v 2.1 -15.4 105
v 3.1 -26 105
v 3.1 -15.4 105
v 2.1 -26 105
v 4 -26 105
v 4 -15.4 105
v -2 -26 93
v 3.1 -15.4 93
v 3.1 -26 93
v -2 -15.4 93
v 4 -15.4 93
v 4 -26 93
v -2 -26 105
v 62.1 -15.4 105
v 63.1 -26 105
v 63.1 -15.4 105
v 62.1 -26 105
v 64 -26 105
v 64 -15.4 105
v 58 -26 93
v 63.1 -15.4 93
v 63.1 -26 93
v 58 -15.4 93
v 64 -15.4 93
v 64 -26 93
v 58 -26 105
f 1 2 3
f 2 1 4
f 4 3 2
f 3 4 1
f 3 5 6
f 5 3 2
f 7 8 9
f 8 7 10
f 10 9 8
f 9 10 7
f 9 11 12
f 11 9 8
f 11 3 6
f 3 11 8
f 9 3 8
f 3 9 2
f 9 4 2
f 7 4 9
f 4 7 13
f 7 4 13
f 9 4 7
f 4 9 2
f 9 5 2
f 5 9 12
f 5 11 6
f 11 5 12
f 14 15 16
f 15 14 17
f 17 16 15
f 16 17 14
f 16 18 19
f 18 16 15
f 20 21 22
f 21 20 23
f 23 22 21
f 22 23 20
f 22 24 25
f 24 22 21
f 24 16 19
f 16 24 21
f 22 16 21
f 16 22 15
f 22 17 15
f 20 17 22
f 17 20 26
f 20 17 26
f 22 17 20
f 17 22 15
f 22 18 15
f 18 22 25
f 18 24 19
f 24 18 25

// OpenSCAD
// file: ../stage.scad
// ============================================================
//  Positioning stage: base (X dovetail) -> x-slider with column
//  (Z dovetail) -> z-slider (payload face toward +Y) + column cap.
//  Every axis: M3 adjust screw captured in the fixed part by head +
//  nylock, threading into a captive nut in the moving part
//  (0.5 mm/turn, both directions), plus an M3 lock screw.
//  Modules model parts in stage-local coordinates at mid travel.
// ============================================================
include <lib.scad>

// Dovetail standing on the column's +Y face, running along Z.
// multmatrix maps (x,y,z) -> (y,z,x): run->Z, width->X, height->Y.
module zrail_frame() { multmatrix([[0,1,0,0],[0,0,1,0],[1,0,0,0]]) children(); }

module stage_base() {
    rail_x0 = -stage_L / 2;
    rail_len = stage_L - stage_tab_t;
    tab_h = stage_base_h + xs_screw_z + 6;
    difference() {
        union() {
            translate([-stage_L / 2, -stage_D / 2, 0]) cube([stage_L, stage_D, stage_base_h]);
            translate([rail_x0, 0, stage_base_h]) dovetail_rail(rail_len);
            // adjust-screw tab
            translate([stage_L / 2 - stage_tab_t, -8, 0]) cube([stage_tab_t, 16, tab_h]);
        }
        wood_screw_holes(stage_mount_pts, stage_base_h, cbore = 3);
        // X adjust screw through tab (head outside, nylock inside)
        translate([stage_L / 2 - stage_tab_t - 1, 0, stage_base_h + xs_screw_z])
            rotate([0, 90, 0]) screw_hole(m3_d, stage_tab_t + 2);
    }
}

// Upper stack shares the x-slider's X offset.
module stage_x_slider() {
    x0 = xs_xc - xs_len / 2;
    difference() {
        union() {
            translate([x0, -xs_w / 2, stage_base_h]) cube([xs_len, xs_w, xs_h]);
            // column
            translate([xs_xc - col_w / 2, col_y0, xs_top - 0.01]) cube([col_w, col_t, col_h + 0.01]);
            translate([xs_xc, col_y1, xs_top]) zrail_frame() dovetail_rail(col_h);
        }
        translate([x0 - 1, 0, stage_base_h]) dovetail_slot(xs_len + 2);
        // X adjust: screw enters +X face, nut dropped in from the top
        translate([x0 + xs_len + 0.01, 0, stage_base_h + xs_screw_z]) rotate([0, -90, 0])
            screw_hole(m3_d, xs_adj_hole);
        translate([x0 + xs_len - 6 - m3_nut_t / 2, -(m3_nut_af + clr) / 2, stage_base_h + xs_screw_z - 3.5])
            cube([m3_nut_t + 0.4, m3_nut_af + clr, xs_h]);
        // X lock: horizontal from +Y face onto rail flank, nut from top
        translate([xs_xc + 8, xs_w / 2 + 0.01, stage_base_h + 2.5]) rotate([90, 0, 0])
            screw_hole(m3_d, xs_w / 2 - 3);
        translate([xs_xc + 8 - (m3_nut_af + clr) / 2, 9 - (m3_nut_t + 0.4) / 2, stage_base_h + 2.5 - 3.3])
            cube([m3_nut_af + clr, m3_nut_t + 0.4, xs_h]);
        // cap screws (tapped into column top)
        for (sx = [-8, 8]) translate([xs_xc + sx, col_y0 + 5, col_top - 10])
            screw_hole(m3_tap, 10.1);
    }
}

module stage_z_slider() {
    y0 = col_y1;
    x0 = xs_xc - zs_w / 2;
    difference() {
        translate([x0, y0, zs_z0]) cube([zs_w, zs_t, zs_h]);
        translate([xs_xc, col_y1, zs_z0 - 1]) zrail_frame() dovetail_slot(zs_h + 2);
        // payload holes + nut slots from the bottom
        for (p = payload_pts) {
            translate([xs_xc + p[0], payload_face_y + 0.01, stage_payload_z + p[1]])
                rotate([90, 0, 0]) screw_hole(m3_d, 7.5);
            translate([xs_xc + p[0] - (m3_nut_af + clr) / 2, payload_face_y - 4 - (m3_nut_t + 0.4) / 2, zs_z0 - 1])
                cube([m3_nut_af + clr, m3_nut_t + 0.4, zs_h / 2 + 1 + 3.3]);
        }
        // Z adjust: through hole, nut slot from the -X side 5 below the top
        translate([xs_xc + zs_screw_x, zs_screw_y, zs_z0 + zs_h - zs_adj_hole]) screw_hole(m3_d, zs_adj_hole + 0.1);
        translate([x0 - 1, zs_screw_y - (m3_nut_af + clr) / 2, zs_z0 + zs_h - 5 - (m3_nut_t + 0.4) / 2])
            cube([zs_screw_x + zs_w / 2 + 1 + (m3_nut_af + clr) / 2, m3_nut_af + clr, m3_nut_t + 0.4]);
        // Z lock: from the +X (outward) side onto the rail flank, nut dropped in from the top
        lz = zs_z0 + zs_h - 5;
        x1 = x0 + zs_w;
        translate([x1 + 0.01, col_y1 + 2, lz]) rotate([0, -90, 0]) screw_hole(m3_d, zs_w / 2 - 4);
        translate([x1 - 2.5 - (m3_nut_t + 0.4), col_y1 + 2 - zl_pocket_w / 2, lz - (m3_nut_af + clr) / 2 / cos(30)])
            cube([m3_nut_t + 0.4, zl_pocket_w, zs_h]);
    }
}

module stage_z_cap() {
    difference() {
        // stops 1 mm short of the payload face so the payload never rubs it
        translate([xs_xc - col_w / 2, col_y0, col_top]) cube([col_w, payload_face_y - col_y0 - 1, cap_t]);
        for (sx = [-8, 8]) translate([xs_xc + sx, col_y0 + 5, col_top]) screw_hole(m3_d, cap_t);
        translate([xs_xc + zs_screw_x, zs_screw_y, col_top]) screw_hole(m3_d, cap_t);
    }
}

// ---- placed at a fine-travel offset (dx, dz) ----
module stage_x_slider_placed(dx = 0) { translate([dx, 0, 0]) stage_x_slider(); }
module stage_z_cap_placed(dx = 0)    { translate([dx, 0, 0]) stage_z_cap(); }
module stage_z_slider_placed(dx = 0, dz = 0) { translate([dx, 0, dz]) stage_z_slider(); }

// Children placed at the payload face centre (origin on the face, +Y out).
module stage_payload_origin(dx = 0, dz = 0) {
    translate([xs_xc + dx, payload_face_y, stage_payload_z + dz]) children();
}

// Optional mirror (tower B) wraps the stage-local geometry.
module stage_hand(mir) { if (mir) mirror([1, 0, 0]) children(); else children(); }

module stage_assembly(dx = 0, dz = 0) {
    color("SteelBlue") stage_base();
    color("LightSteelBlue") stage_x_slider_placed(dx);
    color("SkyBlue") stage_z_cap_placed(dx);
    color("CadetBlue") stage_z_slider_placed(dx, dz);
}

// ---- travel checks ----
_right_gap = (stage_L / 2 - stage_tab_t) - (xs_xc + xs_len / 2) - locknut_t;
_left_ok   = 10;   // slider may overhang the rail start by up to 10 mm
echo("CHECK", "stage_travel_x", 2 * min(_right_gap, _left_ok));
// adjust screws: head on the fixed tab/cap, tip must pass the moving nut
// at the far travel end and stay inside the hole at the near end
_xnut = xs_xc + xs_len / 2 - 6;                  // nut centre X at mid
_xtip = stage_L / 2 - x_adj_len;
echo("CHECK", "x_adj_engage", (_xnut - stage_travel - (m3_nut_t + 0.4) / 2) - _xtip);
echo("CHECK", "x_adj_hole", _xtip - (xs_xc + xs_len / 2 + stage_travel - xs_adj_hole));
_znut = zs_z0 + zs_h - 5;
_ztip = stage_top_z - z_adj_len;
echo("CHECK", "z_adj_engage", (_znut - stage_travel - (m3_nut_t + 0.4) / 2) - _ztip);
echo("CHECK", "z_adj_hole", _ztip - (zs_z0 + zs_h + stage_travel - zs_adj_hole));
echo("CHECK", "z_lock_pocket_w", zl_pocket_w);
echo("CHECK", "stage_travel_z", 2 * min(stage_gap_z, cap_gap - locknut_t));
// file: ../axes.scad
// ============================================================
//  Plug carriage: X base (fixed, X servo) -> X carriage (rack on
//  its -Y face, Y servo) -> Y carriage (rack on its -X face, male
//  stage pad, cable pillar).
//  World coords; carriage modules take x_pos (plug X) / y_pos.
// ============================================================
include <stage.scad>

runner_w = 10;     // plain (non-dovetail) rear X runner
runner_h = dt_h;

// ---------------- X base ----------------
xb_x0 = x_rail_x0 - 6;
xb_x1 = x_rail_x0 + x_rail_len + 6;
xb_y0 = x_shaft_y - servo_body[0] + servo_shaft_off - 12;
xb_y1 = xc_y1;
xb_screws = [[xb_x0 + 7, xb_y0 + 7], [xb_x1 - 7, xb_y0 + 7],
             [xb_x0 + 7, xb_y1 - 7], [xb_x1 - 7, xb_y1 - 7],
             [(xb_x0 + xb_x1) / 2, xb_y1 - 7]];

module x_servo_holder_world() {
    at_inverted_servo(x_shaft_x, x_shaft_y, x_pinion_z0, 90) mg995_holder();
}
// Holder floor-screw holes, mapped from the holder frame to the floor.
module x_holder_floor_holes() {
    at_inverted_servo(x_shaft_x, x_shaft_y, x_pinion_z0, 90) translate([0, 0, holder_floor_up])
        mirror([0, 0, 1]) translate([0, 0, -xb_t]) holder_floor_holes(xb_t);
}
module x_servo_world() {
    at_inverted_servo(x_shaft_x, x_shaft_y, x_pinion_z0, 90) mg995_model();
    x_servo_holder_world();
}
module x_pinion_world() {
    translate([x_shaft_x, x_shaft_y, x_pinion_z0]) color("Gold") pinion();
}

module x_base() {
    difference() {
        union() {
            translate([xb_x0, xb_y0, 0]) cube([xb_x1 - xb_x0, xb_y1 - xb_y0, xb_t]);
            translate([x_rail_x0, x_rail_y[1], xb_t]) dovetail_rail(x_rail_len);
            translate([x_rail_x0, x_rail_y[0] - runner_w / 2, xb_t - 0.01])
                cube([x_rail_len, runner_w, runner_h + 0.01]);
        }
        wood_screw_holes(xb_screws, xb_t, cbore = 2);
        x_holder_floor_holes();
        // pinion clearance pocket (keeps the plate clear of the gear)
        translate([x_shaft_x, x_shaft_y, xb_t - 1]) cylinder(r = pinion_pd / 2 + gear_mod + 1, h = 2);
        // servo-lead exit notch at the rear edge, plus zip-tie slots
        translate([x_shaft_x - 6, xb_y0 - 1, -1]) cube([12, 8, xb_t + 2]);
        for (dx = [-10, 10]) translate([x_shaft_x + dx - 1.5, xb_y0 + 12, -1]) cube([3, 5, xb_t + 2]);
    }
}

// ---------------- X carriage (modelled at x_pos = 0) ----------------
module y_servo_holder_local() {
    at_inverted_servo(y_shaft_x_rel, y_shaft_y, y_pinion_z0, 90) mg995_holder();
}
module y_holder_floor_holes() {
    at_inverted_servo(y_shaft_x_rel, y_shaft_y, y_pinion_z0, 90) translate([0, 0, holder_floor_up])
        mirror([0, 0, 1]) translate([0, 0, -xc_h]) holder_floor_holes(xc_h);
}
module y_servo_local() {
    at_inverted_servo(y_shaft_x_rel, y_shaft_y, y_pinion_z0, 90) mg995_model();
}

module x_carriage() {
    difference() {
        union() {
            translate([xc_x0, xc_y0, xc_z0]) cube([xc_len, xc_y1 - xc_y0, xc_h]);
            // X rack on the -Y face, teeth toward -Y
            translate([xc_x0, xc_y0 + 0.01, x_rack_z0]) mirror([0, 1, 0]) rack(xc_len, base_h = rack_base);
            // Y rail on top, under the Y carriage
            translate([-xs_xc, xc_y0, xc_top]) rotate([0, 0, 90]) dovetail_rail(xc_y1 - xc_y0);
        }
        y_holder_floor_holes();
        translate([xc_x0 - 1, x_rail_y[1], xc_z0]) dovetail_slot(xc_len + 2);
        translate([xc_x0 - 1, x_rail_y[0] - runner_w / 2 - clr - 0.15, xc_z0 - 1])
            cube([xc_len + 2, runner_w + 2 * clr + 0.3, runner_h + clr + 1]);
        translate([xc_x0 - 1, x_rail_y[0], xc_z0]) rotate([90, 0, 90]) linear_extrude(xc_len + 2)
            chamfer_mouth(runner_w + 2 * clr + 0.3);
        // lightening / Y-servo lead pass-through + zip-tie slots
        translate([y_shaft_x_rel - 6, xc_y0 + 3, xc_top - 4]) cube([12, 6, 5]);
        for (dy = [12, 24]) translate([xc_x0 + 3, xc_y0 + dy, xc_z0 + runner_h + 2]) cube([5, 3, xc_h]);
    }
}
module x_carriage_world(x_pos) { translate([x_pos, 0, 0]) x_carriage(); }
module y_servo_world(x_pos) { translate([x_pos, 0, 0]) { y_servo_local(); y_servo_holder_local(); } }
module y_pinion_world(x_pos) {
    translate([x_pos + y_shaft_x_rel, y_shaft_y, y_pinion_z0]) color("Gold") pinion();
}

echo("CHECK", "x_rail_len", x_rail_len);
// X base front edge to the port towers' base front edge (Y)
echo("CHECK", "xbase_tower_gap", (tower_y - stage_D / 2) - xb_y1);
echo("CHECK", "x_mesh_gap", (x_pitch_y - x_shaft_y) - pinion_pd / 2);
echo("CHECK", "x_travel_needed", x_pos_max - x_pos_min);

// ---------------- Y carriage (coords relative to male stage origin
//                  in X/Y, world Z) ----------------
pillar_w   = 16;
// top of the flexure frame (mirrors plug_mount.scad) + 6 so the cable clears it
pillar_top = port_z + plug_drop - 1 + flex_isl_h + 6 + 5 + 6;

module y_carriage() {
    difference() {
        union() {
            translate([yc_x0, yc_y0, yc_z0]) cube([yc_x1 - yc_x0, yc_len, yc_h]);
            // Y rack on the -X face, teeth toward -X
            translate([yc_x0 + 0.01, yc_y0, y_rack_z0]) rotate([0, 0, 90]) rack(yc_len, base_h = rack_base);
            // cable strain-relief pillar at the rear, in line with the plug
            translate([xs_xc - pillar_w / 2, yc_y0, yc_z0]) cube([pillar_w, yc_pillar_d, pillar_top - yc_z0]);
        }
        translate([0, yc_y0 - 1, yc_z0]) rotate([0, 0, 90]) dovetail_slot(yc_len + 2);
        // M4 bolts up through captive nuts into the stage base
        for (p = stage_mount_pts) translate([p[0], p[1], yc_z0]) {
            screw_hole(m4_d, yc_h);
            translate([0, 0, -0.01]) m4_nut_trap(m4_nut_t + 0.5);
        }
        // two zip-tie slots through the pillar, near its front face
        for (dz = [6, 18]) translate([xs_xc - pillar_w / 2 - 1, yc_y0 + yc_pillar_d - 5.5, pillar_top - dz])
            cube([pillar_w + 2, 3, 5]);
    }
}
module y_carriage_world(x_pos, y_pos) {
    o = ms_origin(x_pos, y_pos);
    translate([o[0], o[1], 0]) y_carriage();
}

echo("CHECK", "m4_stage_bolt_protrude", m4_stage_bolt_len - ((stage_base_h - 3) + yc_h));
echo("CHECK", "y_mesh_gap", ((y_pitch_x_rel - xs_xc) - y_shaft_x_rel) - pinion_pd / 2);
echo("CHECK", "pillar_top_z", pillar_top);
echo("CHECK", "pillar_min", port_z + 25);
// rack length left past the pinion centre at the worst travel end
echo("CHECK", "x_rack_engage_min",
     min(x_shaft_x - (x_pos_max + xc_x0), (x_pos_min + xc_x1) - x_shaft_x));
echo("CHECK", "y_rack_engage_min",
     min(y_shaft_y - (ms_origin(0, y_travel)[1] + yc_y0), (ms_origin(0, 0)[1] + yc_y1) - y_shaft_y));
// file: ../port_tower.scad
// ============================================================
//  Female port tower: positioning stage (rotated 180 deg so its
//  payload face looks toward -Y) + bracket plate with the keyed
//  D-hole. The bulkhead goes in from the back (flange behind the
//  plate), nut on the front. Plate front face is at world y=0.
// ============================================================
include <stage.scad>

bracket_w      = 36;
bracket_hole_dz = port_z - stage_payload_z;   // hole above payload centre
bracket_bot    = -zs_h / 2;
bracket_top    = bracket_hole_dz + bh_nut_af / cos(30) / 2 + 3;
rib_t          = 5;     // rib width (X)
rib_d          = 7;     // rib depth (out of the plate front)

// Payload-face coordinates: origin at face centre, +Y away from the stage.
module port_bracket() {
    difference() {
        union() {
            translate([-bracket_w / 2, 0, bracket_bot]) cube([bracket_w, plate_t, bracket_top - bracket_bot]);
            // stiffening ribs, outboard of the nut and clear of the plug clamp
            for (sx = [-1, 1])
                translate([sx > 0 ? bracket_w / 2 - rib_t : -bracket_w / 2, plate_t - 0.01, bracket_bot])
                    hull() {
                        cube([rib_t, rib_d, 1]);
                        translate([0, 0, bracket_hole_dz - 14]) cube([rib_t, 0.01, 1]);
                    }
        }
        // keyed D-hole, flat on top
        translate([0, plate_t, bracket_hole_dz]) rotate([90, 0, 0]) d_hole(t = plate_t);
        // mounting screws into the z-slider's captive nuts
        for (p = payload_pts) translate([p[0], -0.01, p[1]]) rotate([-90, 0, 0]) {
            screw_hole(m3_d, plate_t + rib_d);
        }
    }
}

// Whole tower in world coordinates at fine-travel offset (dx, dz),
// measured in world X / Z.
// Tower B (i=1) is the mirror image so its X adjust screw faces outward.
module port_tower_world(i, dx = 0, dz = 0) {
    ldx = i == 0 ? -dx : dx;   // world dx -> stage-local dx
    translate([tower_x(i), tower_y, 0]) rotate([0, 0, 180]) stage_hand(i == 1) {
        stage_assembly(ldx, dz);
        stage_payload_origin(ldx, dz) color("Orange") port_bracket();
    }
}

// Bulkhead connector stand-in (for checks / preview), world coords.
module bulkhead_world(i, dx = 0, dz = 0) {
    translate([port_x[i] + dx, port_face_y, port_z + dz]) rotate([90, 0, 0]) color("DimGray") {
        cylinder(d = bh_thread_d, h = bh_thread_len - plate_t);                   // thread + face
        cylinder(d = bh_nut_af / cos(30), h = bh_nut_t, $fn = 6);                  // nut
        translate([0, 0, -plate_t - 2]) cylinder(d = bh_flange_d, h = 2);          // flange
        translate([0, 0, -plate_t - 40]) cylinder(d = 14, h = 38);                 // body
    }
}

echo("CHECK", "port_z", port_z);
// file: ../plug_mount.scad
// ============================================================
//  Male plug mount: flexure (frame + 4 L-beams + floating island with
//  the clamp cradle built in), clamp cap, and two identical stop
//  straps (front + back) whose pins limit X/Z float to +/-flex_float
//  and whose 1 mm standoff limits Y float to +/-flex_stop_gap.
//  Local coords: origin at the stage payload face centre, +Y away from
//  the stage, Z relative to the payload centre.
// ============================================================
include <port_tower.scad>
include <axes.scad>

plug_dz  = port_z - (yc_top + stage_payload_z);   // plug centre above payload centre
blk_x    = plug_bx / 2 + 0.1;           // snug in X
blk_y0   = flex_t + clamp_wall;                   // block back face
blk_y1   = blk_y0 + plug_by;                // block front face
blk_z0   = plug_dz + plug_drop;                   // block bottom
blk_z1   = blk_z0 + plug_block[2];
crad_x   = blk_x + 5;                             // cradle half width
crad_y1  = blk_y1 - 0.4;                          // cradle stops short: cap clamps the block
cap_back_y = crad_y1;
crad_scr = blk_x + 2.5;                           // cradle screw X
clamp_ledge = 0.5;                                // keeps clamp >= 12.5 above plug centre

isl_x    = 19;                                    // island half width
isl_z0   = blk_z0 - 1;
isl_z1   = isl_z0 + flex_isl_h;
flex_g   = 6;                                     // island-to-frame gap
in_x     = isl_x + flex_g;
in_z0    = isl_z0 - flex_g;
in_z1    = isl_z1 + flex_g;
fr_bar   = 5;
fr_x     = in_x + fr_bar;
fr_z0    = -zs_h / 2;
fr_z1    = in_z1 + fr_bar;

pin_d    = 4;
pin_z    = isl_z1 - 4;
pin_hole = pin_d + 2 * flex_float;
strap_w  = 8;
strap_t  = 3;
strap_foot_w = 18;
strap_z0 = pin_z - 4;
strap_scr = [-5, 5];                              // strap screw X (through the top bar)
strap_scr_z = (in_z1 + fr_z1) / 2;

// one L-beam: island bottom face -> down -> outward -> up -> frame side
leg = 3;
function beam_path(sx, sz) = let(zc = (isl_z0 + isl_z1) / 2,
    zi = sz < 0 ? isl_z0 : isl_z1,
    zh = zi + sz * leg,
    zv = zc + sz * (flex_g - 2 + 0.5),
    xv = sx * (isl_x + leg))
    [[sx * 10, zi], [sx * 10, zh], [xv, zh], [xv, zv], [sx * in_x, zv]];

module poly_beam(pts, w) {
    for (k = [0:len(pts) - 2]) hull() {
        translate(pts[k]) square(w, center = true);
        translate(pts[k + 1]) square(w, center = true);
    }
}

// XZ outline helpers: 2D (x, z) extruded along +Y from y0, thickness t
module xz_extrude(y0, t) { translate([0, y0 + t, 0]) rotate([90, 0, 0]) linear_extrude(t) children(); }

module plug_flexure() {
    difference() {
        union() {
            xz_extrude(0, flex_t) {
                difference() {
                    translate([-fr_x, fr_z0]) square([2 * fr_x, fr_z1 - fr_z0]);
                    translate([-in_x, in_z0]) square([2 * in_x, in_z1 - in_z0]);
                }
                translate([-isl_x, isl_z0]) square([2 * isl_x, isl_z1 - isl_z0]);
                for (sx = [-1, 1], sz = [-1, 1]) poly_beam(beam_path(sx, sz), flex_beam_w);
            }
            // clamp cradle on the island front: back wall + side walls
            translate([-crad_x, flex_t - 0.01, blk_z0]) cube([2 * crad_x, clamp_wall + 0.01, plug_block[2]]);
            for (sx = [-1, 1]) translate([sx > 0 ? blk_x : -crad_x, blk_y0 - 0.01, blk_z0])
                cube([crad_x - blk_x, crad_y1 - blk_y0 + 0.01, plug_block[2]]);
            // Z retention: thin ledge under the block, lips over its top corners
            translate([-crad_x, blk_y0 - 0.01, blk_z0 - clamp_ledge]) cube([2 * crad_x, crad_y1 - blk_y0 + 0.01, clamp_ledge]);
            for (sx = [-1, 1]) translate([sx > 0 ? blk_x - 1 : -crad_x, blk_y0 - 0.01, blk_z1])
                cube([crad_x - blk_x + 1, crad_y1 - blk_y0 + 0.01, 1.5]);
        }
        // payload screws into the stage z-slider
        for (p = payload_pts) translate([p[0], -0.01, p[1]]) rotate([-90, 0, 0]) screw_hole(m3_d, flex_t);
        // stop-pin hole (through) and strap screws (through the top bar)
        translate([0, -0.01, pin_z]) rotate([-90, 0, 0]) screw_hole(pin_hole, flex_t);
        for (x = strap_scr) translate([x, -0.01, strap_scr_z]) rotate([-90, 0, 0]) screw_hole(m3_d, flex_t);
        // cap screws, tapped into the cradle side walls
        for (sx = [-1, 1]) translate([sx * crad_scr, crad_y1 + 0.01, (blk_z0 + blk_z1) / 2])
            rotate([90, 0, 0]) screw_hole(m3_tap, crad_y1 - flex_t + 1);
    }
}

// Clamp cap: 1.5 mm over the block, thicker over the screws.
module plug_clamp_cap() {
    // flat back at the cradle front: squeezes the block (it stands 0.4 proud)
    difference() {
        union() {
            translate([-crad_x, cap_back_y, blk_z0]) cube([2 * crad_x, blk_y1 - cap_back_y + clamp_lip_t, plug_block[2]]);
            for (sx = [-1, 1]) translate([sx > 0 ? blk_x : -crad_x, cap_back_y, blk_z0])
                cube([crad_x - blk_x, 4, plug_block[2]]);
        }
        for (sx = [-1, 1]) translate([sx * crad_scr, cap_back_y - 0.01, (blk_z0 + blk_z1) / 2])
            rotate([-90, 0, 0]) screw_hole(m3_d, 5);
    }
}

// Stop strap in its own frame: back face on y=0, pin toward -Y.
module plug_flex_stop() {
    difference() {
        union() {
            translate([-strap_w / 2, 0, strap_z0]) cube([strap_w, strap_t, fr_z1 - strap_z0]);
            translate([-strap_foot_w / 2, -flex_stop_gap, in_z1]) cube([strap_foot_w, strap_t + flex_stop_gap, fr_z1 - in_z1]);
            translate([0, 0.01, pin_z]) rotate([90, 0, 0]) cylinder(d = pin_d, h = flex_stop_gap + 2);
        }
        for (x = strap_scr) translate([x, -flex_stop_gap - 0.01, strap_scr_z]) rotate([-90, 0, 0])
            screw_hole(m3_d, strap_t + flex_stop_gap);
    }
}

module plug_flex_stops_placed() {
    translate([0, flex_t + flex_stop_gap, 0]) plug_flex_stop();                       // front
    translate([0, -flex_stop_gap, 0]) mirror([0, 1, 0]) plug_flex_stop();            // back
}

module plug_body_local() {
    color("White") {
        translate([-plug_bx / 2, blk_y0, blk_z0]) cube([plug_bx, plug_by, plug_block[2]]);
        translate([0, blk_y0 + plug_by / 2, blk_z1]) cylinder(d = 4.5, h = 15);              // cable
        hull() {
            translate([-plug_bx / 2, blk_y0, plug_dz - 4]) cube([plug_bx, plug_by, blk_z0 - plug_dz + 4]);
            translate([0, blk_y1 + plug_head_proj - 1, plug_dz]) rotate([-90, 0, 0]) cylinder(d = 8, h = 1);
        }
    }
}

// Everything that moves with the plug carriage, minus the plug itself.
module plug_mount_world(x_pos, y_pos, dx = 0, dz = 0) {
    o = ms_origin(x_pos, y_pos);
    translate(o) {
        stage_assembly(dx, dz);
        stage_payload_origin(dx, dz) {
            color("Orange") plug_flexure();
            color("Gold") plug_clamp_cap();
            color("Khaki") plug_flex_stops_placed();
        }
    }
}
module plug_body_world(x_pos, y_pos, dx = 0, dz = 0) {
    o = ms_origin(x_pos, y_pos);
    translate(o) stage_payload_origin(dx, dz) plug_body_local();
}

// ---- checks ----
echo("CHECK", "clamp_lip_t", clamp_lip_t);
echo("CHECK", "clamp_preload", blk_y1 - cap_back_y);
echo("CHECK", "clamp_x_play", blk_x - plug_bx / 2);
echo("CHECK", "pillar_above_flex", pillar_top - (yc_top + stage_payload_z + fr_z1));
echo("CHECK", "clamp_bottom_above_plug", blk_z0 - clamp_ledge - plug_dz);
echo("CHECK", "plug_insert_err",
     (ms_origin(0, y_travel)[1] + payload_face_y + blk_y1 + plug_head_proj) - bh_face_y);
echo("CHECK", "flex_xz_stop", (pin_hole - pin_d) / 2);
// beam-to-island and beam-to-frame clearance must exceed the stop travel
echo("CHECK", "flex_beam_clear", leg - flex_beam_w / 2);
// file: ../assembly_lib.scad
// World-placement groups shared by assembly.scad and the full-machine
// collision test. Pinions are left out of these groups because they
// mesh with the racks by design.
include <plug_mount.scad>

module fixed_world() {
    for (i = [0, 1]) { port_tower_world(i); bulkhead_world(i); }
    color("Tan") x_base();
    x_servo_world();
}

module moving_world(x_pos, y_pos) {
    color("LightGreen") x_carriage_world(x_pos);
    y_servo_world(x_pos);
    color("Yellow") y_carriage_world(x_pos, y_pos);
    plug_mount_world(x_pos, y_pos);
}
// file: probe_lib.scad
// Fit probes built only from the port position and the measured part
// sizes (not from the bracket / clamp variables), so they test the real
// geometry rather than restating its formulas.
include <../assembly_lib.scad>

// Bulkhead thread cross-section (15 mm, flat 6.5 mm from centre, on top)
// pushed through port i's plate, offset by d = [dx, dz].
module probe_port_thread(i, d) {
    translate([port_x[i] + d[0], port_face_y + plate_t + 1, port_z + d[1]]) rotate([90, 0, 0])
        linear_extrude(plate_t + 2) intersection() {
            circle(d = bh_thread_d, $fn = 96);
            translate([-bh_thread_d, -bh_thread_d]) square([2 * bh_thread_d, bh_thread_d + bh_flat]);
        }
}
module probe_port_hole(d) {
    for (i = [0, 1]) intersection() { port_tower_world(i); probe_port_thread(i, d); }
}

// Plug clamp block where it must sit for the magnetic face to meet port
// i's face: face centre at (port_x, bh_face_y, port_z).
module probe_block(i, d) {
    translate([port_x[i] - plug_bx / 2 + d[0],
               bh_face_y - plug_head_proj - plug_by + d[1],
               port_z + plug_drop + d[2]])
        cube([plug_bx, plug_by, plug_block[2]]);
}
// Seat = flexure cradle only (the cap squeezes the block on purpose).
module probe_plug_seat(d) {
    for (i = [0, 1]) intersection() {
        translate(ms_origin(port_x[i], y_travel)) stage_payload_origin() plug_flexure();
        probe_block(i, d);
    }
}
// main file
// 1 mm sideways: must hit a side wall.
include <probe_lib.scad>
probe_plug_seat([1, 0, 0]);
